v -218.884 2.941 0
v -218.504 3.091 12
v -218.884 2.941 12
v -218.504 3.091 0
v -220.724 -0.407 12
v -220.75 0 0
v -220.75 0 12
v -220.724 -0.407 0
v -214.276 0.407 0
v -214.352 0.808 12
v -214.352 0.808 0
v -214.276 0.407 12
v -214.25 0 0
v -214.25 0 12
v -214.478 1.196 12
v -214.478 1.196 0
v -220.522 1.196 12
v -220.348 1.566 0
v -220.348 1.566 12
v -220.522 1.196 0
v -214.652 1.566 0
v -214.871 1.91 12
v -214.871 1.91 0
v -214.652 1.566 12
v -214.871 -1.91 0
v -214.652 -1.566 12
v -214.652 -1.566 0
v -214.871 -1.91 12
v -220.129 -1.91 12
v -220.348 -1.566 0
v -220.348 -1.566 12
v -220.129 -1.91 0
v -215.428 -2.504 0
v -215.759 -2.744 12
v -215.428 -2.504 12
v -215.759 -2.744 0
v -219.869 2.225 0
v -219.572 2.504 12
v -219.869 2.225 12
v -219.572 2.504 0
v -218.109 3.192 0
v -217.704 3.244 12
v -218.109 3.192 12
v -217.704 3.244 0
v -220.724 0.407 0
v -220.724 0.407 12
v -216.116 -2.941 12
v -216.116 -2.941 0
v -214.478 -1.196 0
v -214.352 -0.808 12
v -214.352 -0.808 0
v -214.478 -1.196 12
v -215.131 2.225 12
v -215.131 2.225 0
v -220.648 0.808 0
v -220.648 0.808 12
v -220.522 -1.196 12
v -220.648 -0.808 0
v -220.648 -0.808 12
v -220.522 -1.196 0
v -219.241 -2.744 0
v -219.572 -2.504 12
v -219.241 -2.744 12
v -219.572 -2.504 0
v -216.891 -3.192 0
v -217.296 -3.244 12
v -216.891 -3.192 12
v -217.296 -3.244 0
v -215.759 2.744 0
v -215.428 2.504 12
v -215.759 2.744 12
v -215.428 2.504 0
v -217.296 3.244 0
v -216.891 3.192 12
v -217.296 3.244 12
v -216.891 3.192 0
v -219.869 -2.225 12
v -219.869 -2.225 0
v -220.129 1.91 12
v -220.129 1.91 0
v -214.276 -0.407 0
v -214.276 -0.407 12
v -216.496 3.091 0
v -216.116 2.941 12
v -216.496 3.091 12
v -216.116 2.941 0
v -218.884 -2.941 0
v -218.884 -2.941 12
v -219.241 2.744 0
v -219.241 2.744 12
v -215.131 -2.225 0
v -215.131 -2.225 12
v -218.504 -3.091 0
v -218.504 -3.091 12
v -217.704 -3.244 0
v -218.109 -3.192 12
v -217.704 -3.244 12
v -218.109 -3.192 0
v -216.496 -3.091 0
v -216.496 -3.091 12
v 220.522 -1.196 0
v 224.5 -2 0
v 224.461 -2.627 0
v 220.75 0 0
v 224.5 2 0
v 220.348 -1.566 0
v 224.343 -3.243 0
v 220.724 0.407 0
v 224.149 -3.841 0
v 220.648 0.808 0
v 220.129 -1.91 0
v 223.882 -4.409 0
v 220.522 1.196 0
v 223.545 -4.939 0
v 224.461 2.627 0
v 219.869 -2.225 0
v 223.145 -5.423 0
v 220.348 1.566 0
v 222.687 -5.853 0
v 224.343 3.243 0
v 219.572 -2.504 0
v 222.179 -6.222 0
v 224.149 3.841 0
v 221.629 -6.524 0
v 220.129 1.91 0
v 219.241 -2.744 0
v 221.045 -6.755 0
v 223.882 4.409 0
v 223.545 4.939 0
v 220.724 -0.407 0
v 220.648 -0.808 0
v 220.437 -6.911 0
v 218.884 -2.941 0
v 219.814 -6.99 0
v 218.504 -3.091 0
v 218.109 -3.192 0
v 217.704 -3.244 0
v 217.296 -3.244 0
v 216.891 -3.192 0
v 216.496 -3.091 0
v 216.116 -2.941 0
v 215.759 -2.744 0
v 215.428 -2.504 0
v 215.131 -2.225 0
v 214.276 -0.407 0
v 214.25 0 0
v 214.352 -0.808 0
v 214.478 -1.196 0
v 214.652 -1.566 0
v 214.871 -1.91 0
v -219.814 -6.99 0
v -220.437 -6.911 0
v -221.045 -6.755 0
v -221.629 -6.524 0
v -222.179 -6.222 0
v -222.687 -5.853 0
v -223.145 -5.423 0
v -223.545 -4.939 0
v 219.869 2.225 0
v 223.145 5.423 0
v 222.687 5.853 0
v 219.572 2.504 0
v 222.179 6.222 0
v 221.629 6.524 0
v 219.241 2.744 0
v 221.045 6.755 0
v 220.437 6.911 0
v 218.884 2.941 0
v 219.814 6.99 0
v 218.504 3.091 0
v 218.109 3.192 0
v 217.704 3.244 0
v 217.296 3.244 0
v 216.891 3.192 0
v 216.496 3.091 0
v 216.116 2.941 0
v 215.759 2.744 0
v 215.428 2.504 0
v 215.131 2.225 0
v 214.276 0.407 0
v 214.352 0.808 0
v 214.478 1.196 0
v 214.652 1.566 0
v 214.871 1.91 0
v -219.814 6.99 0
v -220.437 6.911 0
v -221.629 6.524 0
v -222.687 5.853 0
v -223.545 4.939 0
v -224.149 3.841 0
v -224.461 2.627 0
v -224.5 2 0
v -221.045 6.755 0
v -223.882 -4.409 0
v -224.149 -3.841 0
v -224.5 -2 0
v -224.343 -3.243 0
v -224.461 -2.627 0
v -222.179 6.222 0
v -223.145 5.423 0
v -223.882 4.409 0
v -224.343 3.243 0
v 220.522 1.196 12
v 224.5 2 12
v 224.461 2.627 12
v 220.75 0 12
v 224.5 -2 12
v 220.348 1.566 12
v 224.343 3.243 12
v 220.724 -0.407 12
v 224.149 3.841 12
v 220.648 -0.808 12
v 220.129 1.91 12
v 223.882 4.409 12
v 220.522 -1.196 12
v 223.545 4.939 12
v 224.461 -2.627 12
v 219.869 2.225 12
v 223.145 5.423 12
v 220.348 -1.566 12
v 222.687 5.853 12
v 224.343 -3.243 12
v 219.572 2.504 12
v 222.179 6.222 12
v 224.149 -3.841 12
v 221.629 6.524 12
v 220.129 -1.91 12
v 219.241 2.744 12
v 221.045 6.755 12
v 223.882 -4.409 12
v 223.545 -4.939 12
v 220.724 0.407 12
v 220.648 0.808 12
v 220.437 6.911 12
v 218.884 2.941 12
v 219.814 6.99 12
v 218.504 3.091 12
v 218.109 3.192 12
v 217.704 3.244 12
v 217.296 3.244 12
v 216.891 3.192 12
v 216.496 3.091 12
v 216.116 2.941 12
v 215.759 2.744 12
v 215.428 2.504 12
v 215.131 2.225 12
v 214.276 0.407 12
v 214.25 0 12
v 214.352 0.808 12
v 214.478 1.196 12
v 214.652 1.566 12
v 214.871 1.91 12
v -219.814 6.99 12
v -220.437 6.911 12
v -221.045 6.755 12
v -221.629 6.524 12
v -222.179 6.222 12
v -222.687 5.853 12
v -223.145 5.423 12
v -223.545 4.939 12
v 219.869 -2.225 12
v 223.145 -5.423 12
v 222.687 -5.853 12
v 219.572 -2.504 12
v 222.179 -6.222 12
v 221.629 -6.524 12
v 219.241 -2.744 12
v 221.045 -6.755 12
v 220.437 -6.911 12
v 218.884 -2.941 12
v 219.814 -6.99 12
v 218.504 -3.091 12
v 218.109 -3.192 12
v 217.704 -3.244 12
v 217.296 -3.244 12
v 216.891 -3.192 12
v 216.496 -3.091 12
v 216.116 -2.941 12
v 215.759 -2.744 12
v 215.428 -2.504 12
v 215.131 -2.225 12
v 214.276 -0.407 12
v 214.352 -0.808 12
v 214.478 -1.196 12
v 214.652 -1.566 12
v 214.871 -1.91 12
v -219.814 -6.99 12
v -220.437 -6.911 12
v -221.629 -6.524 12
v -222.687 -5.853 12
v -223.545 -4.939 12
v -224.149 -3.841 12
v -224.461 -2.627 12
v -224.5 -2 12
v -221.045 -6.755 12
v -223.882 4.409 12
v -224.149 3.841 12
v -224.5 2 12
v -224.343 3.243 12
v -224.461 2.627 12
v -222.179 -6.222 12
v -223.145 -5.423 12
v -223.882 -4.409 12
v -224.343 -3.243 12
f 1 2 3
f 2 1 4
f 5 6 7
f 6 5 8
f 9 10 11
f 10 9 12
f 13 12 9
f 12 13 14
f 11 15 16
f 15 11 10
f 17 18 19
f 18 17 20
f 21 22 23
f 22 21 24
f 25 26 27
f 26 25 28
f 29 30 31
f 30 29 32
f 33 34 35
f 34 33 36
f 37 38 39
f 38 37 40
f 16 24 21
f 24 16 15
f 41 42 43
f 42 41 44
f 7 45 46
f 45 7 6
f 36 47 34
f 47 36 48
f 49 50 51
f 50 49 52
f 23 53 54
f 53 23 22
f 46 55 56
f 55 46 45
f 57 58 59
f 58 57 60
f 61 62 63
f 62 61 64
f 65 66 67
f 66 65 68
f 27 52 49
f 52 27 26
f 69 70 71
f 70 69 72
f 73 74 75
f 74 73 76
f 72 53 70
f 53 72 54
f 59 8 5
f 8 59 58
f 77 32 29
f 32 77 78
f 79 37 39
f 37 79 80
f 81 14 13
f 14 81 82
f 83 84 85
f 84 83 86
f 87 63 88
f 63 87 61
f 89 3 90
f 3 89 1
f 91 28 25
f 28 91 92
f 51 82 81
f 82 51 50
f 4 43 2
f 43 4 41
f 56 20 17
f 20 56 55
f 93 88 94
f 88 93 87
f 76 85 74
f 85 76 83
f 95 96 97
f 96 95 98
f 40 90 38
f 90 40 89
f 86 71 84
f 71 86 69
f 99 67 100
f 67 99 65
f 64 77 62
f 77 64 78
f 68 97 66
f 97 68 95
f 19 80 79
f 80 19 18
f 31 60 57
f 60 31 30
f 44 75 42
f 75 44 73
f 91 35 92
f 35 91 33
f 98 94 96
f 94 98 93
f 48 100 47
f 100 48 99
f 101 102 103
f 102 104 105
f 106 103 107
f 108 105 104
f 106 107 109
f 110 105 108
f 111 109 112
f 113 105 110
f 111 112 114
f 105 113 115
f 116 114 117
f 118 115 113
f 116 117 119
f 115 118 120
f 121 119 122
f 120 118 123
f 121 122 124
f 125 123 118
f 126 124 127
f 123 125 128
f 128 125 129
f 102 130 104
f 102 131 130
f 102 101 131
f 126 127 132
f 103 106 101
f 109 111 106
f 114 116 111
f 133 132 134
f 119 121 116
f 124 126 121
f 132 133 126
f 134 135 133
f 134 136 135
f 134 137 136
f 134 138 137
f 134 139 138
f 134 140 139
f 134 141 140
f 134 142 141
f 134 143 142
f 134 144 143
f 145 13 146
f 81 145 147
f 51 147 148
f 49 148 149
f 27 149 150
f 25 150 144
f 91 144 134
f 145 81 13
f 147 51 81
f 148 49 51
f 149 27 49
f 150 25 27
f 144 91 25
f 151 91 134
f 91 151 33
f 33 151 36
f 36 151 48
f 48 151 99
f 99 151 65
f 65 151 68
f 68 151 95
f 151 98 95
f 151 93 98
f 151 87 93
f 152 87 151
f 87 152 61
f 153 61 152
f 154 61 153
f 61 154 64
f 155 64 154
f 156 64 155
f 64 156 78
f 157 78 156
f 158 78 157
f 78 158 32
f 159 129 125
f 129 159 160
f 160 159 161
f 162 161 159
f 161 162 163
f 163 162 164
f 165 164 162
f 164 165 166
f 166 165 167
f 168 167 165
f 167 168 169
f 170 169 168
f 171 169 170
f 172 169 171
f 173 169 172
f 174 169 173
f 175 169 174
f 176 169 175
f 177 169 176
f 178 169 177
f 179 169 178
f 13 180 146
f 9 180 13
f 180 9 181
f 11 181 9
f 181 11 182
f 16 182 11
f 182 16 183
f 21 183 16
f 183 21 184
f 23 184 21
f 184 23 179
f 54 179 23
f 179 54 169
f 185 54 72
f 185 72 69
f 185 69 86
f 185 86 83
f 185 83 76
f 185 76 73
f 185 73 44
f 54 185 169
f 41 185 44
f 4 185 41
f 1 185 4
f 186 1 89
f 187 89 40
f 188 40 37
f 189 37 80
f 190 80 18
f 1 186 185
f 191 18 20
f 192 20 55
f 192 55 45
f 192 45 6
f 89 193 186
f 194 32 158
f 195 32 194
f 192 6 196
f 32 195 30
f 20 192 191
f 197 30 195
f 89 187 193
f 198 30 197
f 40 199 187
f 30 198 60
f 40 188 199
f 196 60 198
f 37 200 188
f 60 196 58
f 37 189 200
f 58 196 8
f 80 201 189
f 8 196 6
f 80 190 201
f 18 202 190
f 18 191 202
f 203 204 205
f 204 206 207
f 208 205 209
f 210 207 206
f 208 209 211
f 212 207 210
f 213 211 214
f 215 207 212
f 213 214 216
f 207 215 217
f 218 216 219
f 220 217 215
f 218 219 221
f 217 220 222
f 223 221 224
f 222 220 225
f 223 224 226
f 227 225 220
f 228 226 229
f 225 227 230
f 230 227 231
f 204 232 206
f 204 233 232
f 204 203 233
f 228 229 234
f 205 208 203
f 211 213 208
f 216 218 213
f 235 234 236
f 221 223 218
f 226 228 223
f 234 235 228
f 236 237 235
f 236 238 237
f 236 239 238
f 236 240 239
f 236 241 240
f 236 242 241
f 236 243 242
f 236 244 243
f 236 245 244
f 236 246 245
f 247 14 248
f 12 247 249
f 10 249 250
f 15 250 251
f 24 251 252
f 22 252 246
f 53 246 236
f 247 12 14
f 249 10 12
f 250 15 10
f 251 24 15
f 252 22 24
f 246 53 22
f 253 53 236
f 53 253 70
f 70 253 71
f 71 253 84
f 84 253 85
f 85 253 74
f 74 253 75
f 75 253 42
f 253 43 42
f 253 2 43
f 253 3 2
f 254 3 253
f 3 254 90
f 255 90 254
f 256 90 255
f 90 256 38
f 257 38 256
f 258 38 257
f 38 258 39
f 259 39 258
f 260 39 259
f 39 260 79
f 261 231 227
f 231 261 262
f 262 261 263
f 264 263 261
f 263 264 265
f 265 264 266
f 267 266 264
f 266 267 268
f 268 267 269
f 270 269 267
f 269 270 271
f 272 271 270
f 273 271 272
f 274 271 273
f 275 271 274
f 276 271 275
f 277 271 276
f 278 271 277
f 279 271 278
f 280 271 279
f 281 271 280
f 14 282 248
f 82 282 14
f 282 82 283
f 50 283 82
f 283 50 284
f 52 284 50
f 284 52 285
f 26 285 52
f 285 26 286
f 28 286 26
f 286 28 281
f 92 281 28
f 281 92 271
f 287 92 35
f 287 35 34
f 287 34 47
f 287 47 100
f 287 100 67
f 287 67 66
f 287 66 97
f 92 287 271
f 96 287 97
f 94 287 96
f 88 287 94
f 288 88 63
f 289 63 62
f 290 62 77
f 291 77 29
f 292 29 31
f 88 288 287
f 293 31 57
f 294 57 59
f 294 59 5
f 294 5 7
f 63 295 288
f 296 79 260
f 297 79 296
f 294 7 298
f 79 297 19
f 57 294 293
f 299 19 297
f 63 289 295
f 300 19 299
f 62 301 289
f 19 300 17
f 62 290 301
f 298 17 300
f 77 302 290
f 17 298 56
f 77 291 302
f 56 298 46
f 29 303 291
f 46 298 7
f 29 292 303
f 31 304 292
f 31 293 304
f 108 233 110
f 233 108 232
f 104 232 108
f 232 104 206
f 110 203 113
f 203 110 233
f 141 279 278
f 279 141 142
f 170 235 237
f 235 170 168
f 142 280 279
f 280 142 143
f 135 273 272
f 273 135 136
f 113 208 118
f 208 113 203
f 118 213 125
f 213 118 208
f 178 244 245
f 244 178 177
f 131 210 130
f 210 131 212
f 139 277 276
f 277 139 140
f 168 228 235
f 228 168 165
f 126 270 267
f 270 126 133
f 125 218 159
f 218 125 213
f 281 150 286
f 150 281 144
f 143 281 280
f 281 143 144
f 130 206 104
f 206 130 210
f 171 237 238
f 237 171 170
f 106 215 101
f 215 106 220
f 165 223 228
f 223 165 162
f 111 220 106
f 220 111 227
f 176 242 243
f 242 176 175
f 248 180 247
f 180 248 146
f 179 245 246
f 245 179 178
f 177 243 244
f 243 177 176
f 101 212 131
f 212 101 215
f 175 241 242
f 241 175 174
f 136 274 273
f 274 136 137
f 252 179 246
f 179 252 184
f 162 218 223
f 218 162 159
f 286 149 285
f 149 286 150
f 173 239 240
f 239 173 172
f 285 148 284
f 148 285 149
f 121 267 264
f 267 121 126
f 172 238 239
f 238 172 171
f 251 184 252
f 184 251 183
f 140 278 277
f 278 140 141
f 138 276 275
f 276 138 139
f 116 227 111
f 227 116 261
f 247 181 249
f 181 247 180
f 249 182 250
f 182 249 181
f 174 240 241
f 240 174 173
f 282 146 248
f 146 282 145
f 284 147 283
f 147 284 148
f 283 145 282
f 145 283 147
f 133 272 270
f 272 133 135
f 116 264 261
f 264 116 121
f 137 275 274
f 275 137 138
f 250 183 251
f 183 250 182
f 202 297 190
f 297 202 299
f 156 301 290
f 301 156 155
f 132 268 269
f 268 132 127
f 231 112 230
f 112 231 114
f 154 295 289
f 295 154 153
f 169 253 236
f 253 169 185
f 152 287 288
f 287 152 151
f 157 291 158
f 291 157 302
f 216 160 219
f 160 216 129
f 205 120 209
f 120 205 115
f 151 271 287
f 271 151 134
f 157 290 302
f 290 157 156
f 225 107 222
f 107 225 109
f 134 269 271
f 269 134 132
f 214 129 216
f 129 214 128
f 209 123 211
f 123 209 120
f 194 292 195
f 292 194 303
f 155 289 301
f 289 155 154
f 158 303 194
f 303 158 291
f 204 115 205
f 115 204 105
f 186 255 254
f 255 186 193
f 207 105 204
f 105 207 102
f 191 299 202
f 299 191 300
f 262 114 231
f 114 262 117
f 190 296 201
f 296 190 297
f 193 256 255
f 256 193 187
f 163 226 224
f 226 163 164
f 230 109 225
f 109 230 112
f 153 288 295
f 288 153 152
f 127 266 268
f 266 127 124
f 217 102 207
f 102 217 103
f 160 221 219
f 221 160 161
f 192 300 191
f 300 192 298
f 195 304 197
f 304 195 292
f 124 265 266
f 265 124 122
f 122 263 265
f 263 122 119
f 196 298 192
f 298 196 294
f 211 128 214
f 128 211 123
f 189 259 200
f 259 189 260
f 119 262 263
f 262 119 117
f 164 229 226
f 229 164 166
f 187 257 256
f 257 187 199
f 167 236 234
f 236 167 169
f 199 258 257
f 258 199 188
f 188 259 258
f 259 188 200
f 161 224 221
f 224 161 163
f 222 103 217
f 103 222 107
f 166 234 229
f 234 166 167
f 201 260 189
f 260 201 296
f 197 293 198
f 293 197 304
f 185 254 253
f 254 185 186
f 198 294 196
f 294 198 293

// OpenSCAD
$fn = 50;


difference() {
	union() {
		hull() {
			translate(v = [-219.5000000000, 2.0000000000, 0]) {
				cylinder(h = 12, r = 5);
			}
			translate(v = [219.5000000000, 2.0000000000, 0]) {
				cylinder(h = 12, r = 5);
			}
			translate(v = [-219.5000000000, -2.0000000000, 0]) {
				cylinder(h = 12, r = 5);
			}
			translate(v = [219.5000000000, -2.0000000000, 0]) {
				cylinder(h = 12, r = 5);
			}
		}
	}
	union() {
		translate(v = [-217.5000000000, 0.0000000000, 0]) {
			cylinder(h = 12, r = 3.2500000000);
		}
		translate(v = [217.5000000000, 0.0000000000, 0]) {
			cylinder(h = 12, r = 3.2500000000);
		}
		translate(v = [-217.5000000000, 0.0000000000, 0]) {
			cylinder(h = 12, r = 1.8000000000);
		}
		translate(v = [217.5000000000, 0.0000000000, 0]) {
			cylinder(h = 12, r = 1.8000000000);
		}
		translate(v = [-217.5000000000, 0.0000000000, 0]) {
			cylinder(h = 12, r = 1.8000000000);
		}
		translate(v = [217.5000000000, 0.0000000000, 0]) {
			cylinder(h = 12, r = 1.8000000000);
		}
		translate(v = [-217.5000000000, 0.0000000000, 0]) {
			cylinder(h = 12, r = 1.8000000000);
		}
		translate(v = [217.5000000000, 0.0000000000, 0]) {
			cylinder(h = 12, r = 1.8000000000);
		}
	}
}
